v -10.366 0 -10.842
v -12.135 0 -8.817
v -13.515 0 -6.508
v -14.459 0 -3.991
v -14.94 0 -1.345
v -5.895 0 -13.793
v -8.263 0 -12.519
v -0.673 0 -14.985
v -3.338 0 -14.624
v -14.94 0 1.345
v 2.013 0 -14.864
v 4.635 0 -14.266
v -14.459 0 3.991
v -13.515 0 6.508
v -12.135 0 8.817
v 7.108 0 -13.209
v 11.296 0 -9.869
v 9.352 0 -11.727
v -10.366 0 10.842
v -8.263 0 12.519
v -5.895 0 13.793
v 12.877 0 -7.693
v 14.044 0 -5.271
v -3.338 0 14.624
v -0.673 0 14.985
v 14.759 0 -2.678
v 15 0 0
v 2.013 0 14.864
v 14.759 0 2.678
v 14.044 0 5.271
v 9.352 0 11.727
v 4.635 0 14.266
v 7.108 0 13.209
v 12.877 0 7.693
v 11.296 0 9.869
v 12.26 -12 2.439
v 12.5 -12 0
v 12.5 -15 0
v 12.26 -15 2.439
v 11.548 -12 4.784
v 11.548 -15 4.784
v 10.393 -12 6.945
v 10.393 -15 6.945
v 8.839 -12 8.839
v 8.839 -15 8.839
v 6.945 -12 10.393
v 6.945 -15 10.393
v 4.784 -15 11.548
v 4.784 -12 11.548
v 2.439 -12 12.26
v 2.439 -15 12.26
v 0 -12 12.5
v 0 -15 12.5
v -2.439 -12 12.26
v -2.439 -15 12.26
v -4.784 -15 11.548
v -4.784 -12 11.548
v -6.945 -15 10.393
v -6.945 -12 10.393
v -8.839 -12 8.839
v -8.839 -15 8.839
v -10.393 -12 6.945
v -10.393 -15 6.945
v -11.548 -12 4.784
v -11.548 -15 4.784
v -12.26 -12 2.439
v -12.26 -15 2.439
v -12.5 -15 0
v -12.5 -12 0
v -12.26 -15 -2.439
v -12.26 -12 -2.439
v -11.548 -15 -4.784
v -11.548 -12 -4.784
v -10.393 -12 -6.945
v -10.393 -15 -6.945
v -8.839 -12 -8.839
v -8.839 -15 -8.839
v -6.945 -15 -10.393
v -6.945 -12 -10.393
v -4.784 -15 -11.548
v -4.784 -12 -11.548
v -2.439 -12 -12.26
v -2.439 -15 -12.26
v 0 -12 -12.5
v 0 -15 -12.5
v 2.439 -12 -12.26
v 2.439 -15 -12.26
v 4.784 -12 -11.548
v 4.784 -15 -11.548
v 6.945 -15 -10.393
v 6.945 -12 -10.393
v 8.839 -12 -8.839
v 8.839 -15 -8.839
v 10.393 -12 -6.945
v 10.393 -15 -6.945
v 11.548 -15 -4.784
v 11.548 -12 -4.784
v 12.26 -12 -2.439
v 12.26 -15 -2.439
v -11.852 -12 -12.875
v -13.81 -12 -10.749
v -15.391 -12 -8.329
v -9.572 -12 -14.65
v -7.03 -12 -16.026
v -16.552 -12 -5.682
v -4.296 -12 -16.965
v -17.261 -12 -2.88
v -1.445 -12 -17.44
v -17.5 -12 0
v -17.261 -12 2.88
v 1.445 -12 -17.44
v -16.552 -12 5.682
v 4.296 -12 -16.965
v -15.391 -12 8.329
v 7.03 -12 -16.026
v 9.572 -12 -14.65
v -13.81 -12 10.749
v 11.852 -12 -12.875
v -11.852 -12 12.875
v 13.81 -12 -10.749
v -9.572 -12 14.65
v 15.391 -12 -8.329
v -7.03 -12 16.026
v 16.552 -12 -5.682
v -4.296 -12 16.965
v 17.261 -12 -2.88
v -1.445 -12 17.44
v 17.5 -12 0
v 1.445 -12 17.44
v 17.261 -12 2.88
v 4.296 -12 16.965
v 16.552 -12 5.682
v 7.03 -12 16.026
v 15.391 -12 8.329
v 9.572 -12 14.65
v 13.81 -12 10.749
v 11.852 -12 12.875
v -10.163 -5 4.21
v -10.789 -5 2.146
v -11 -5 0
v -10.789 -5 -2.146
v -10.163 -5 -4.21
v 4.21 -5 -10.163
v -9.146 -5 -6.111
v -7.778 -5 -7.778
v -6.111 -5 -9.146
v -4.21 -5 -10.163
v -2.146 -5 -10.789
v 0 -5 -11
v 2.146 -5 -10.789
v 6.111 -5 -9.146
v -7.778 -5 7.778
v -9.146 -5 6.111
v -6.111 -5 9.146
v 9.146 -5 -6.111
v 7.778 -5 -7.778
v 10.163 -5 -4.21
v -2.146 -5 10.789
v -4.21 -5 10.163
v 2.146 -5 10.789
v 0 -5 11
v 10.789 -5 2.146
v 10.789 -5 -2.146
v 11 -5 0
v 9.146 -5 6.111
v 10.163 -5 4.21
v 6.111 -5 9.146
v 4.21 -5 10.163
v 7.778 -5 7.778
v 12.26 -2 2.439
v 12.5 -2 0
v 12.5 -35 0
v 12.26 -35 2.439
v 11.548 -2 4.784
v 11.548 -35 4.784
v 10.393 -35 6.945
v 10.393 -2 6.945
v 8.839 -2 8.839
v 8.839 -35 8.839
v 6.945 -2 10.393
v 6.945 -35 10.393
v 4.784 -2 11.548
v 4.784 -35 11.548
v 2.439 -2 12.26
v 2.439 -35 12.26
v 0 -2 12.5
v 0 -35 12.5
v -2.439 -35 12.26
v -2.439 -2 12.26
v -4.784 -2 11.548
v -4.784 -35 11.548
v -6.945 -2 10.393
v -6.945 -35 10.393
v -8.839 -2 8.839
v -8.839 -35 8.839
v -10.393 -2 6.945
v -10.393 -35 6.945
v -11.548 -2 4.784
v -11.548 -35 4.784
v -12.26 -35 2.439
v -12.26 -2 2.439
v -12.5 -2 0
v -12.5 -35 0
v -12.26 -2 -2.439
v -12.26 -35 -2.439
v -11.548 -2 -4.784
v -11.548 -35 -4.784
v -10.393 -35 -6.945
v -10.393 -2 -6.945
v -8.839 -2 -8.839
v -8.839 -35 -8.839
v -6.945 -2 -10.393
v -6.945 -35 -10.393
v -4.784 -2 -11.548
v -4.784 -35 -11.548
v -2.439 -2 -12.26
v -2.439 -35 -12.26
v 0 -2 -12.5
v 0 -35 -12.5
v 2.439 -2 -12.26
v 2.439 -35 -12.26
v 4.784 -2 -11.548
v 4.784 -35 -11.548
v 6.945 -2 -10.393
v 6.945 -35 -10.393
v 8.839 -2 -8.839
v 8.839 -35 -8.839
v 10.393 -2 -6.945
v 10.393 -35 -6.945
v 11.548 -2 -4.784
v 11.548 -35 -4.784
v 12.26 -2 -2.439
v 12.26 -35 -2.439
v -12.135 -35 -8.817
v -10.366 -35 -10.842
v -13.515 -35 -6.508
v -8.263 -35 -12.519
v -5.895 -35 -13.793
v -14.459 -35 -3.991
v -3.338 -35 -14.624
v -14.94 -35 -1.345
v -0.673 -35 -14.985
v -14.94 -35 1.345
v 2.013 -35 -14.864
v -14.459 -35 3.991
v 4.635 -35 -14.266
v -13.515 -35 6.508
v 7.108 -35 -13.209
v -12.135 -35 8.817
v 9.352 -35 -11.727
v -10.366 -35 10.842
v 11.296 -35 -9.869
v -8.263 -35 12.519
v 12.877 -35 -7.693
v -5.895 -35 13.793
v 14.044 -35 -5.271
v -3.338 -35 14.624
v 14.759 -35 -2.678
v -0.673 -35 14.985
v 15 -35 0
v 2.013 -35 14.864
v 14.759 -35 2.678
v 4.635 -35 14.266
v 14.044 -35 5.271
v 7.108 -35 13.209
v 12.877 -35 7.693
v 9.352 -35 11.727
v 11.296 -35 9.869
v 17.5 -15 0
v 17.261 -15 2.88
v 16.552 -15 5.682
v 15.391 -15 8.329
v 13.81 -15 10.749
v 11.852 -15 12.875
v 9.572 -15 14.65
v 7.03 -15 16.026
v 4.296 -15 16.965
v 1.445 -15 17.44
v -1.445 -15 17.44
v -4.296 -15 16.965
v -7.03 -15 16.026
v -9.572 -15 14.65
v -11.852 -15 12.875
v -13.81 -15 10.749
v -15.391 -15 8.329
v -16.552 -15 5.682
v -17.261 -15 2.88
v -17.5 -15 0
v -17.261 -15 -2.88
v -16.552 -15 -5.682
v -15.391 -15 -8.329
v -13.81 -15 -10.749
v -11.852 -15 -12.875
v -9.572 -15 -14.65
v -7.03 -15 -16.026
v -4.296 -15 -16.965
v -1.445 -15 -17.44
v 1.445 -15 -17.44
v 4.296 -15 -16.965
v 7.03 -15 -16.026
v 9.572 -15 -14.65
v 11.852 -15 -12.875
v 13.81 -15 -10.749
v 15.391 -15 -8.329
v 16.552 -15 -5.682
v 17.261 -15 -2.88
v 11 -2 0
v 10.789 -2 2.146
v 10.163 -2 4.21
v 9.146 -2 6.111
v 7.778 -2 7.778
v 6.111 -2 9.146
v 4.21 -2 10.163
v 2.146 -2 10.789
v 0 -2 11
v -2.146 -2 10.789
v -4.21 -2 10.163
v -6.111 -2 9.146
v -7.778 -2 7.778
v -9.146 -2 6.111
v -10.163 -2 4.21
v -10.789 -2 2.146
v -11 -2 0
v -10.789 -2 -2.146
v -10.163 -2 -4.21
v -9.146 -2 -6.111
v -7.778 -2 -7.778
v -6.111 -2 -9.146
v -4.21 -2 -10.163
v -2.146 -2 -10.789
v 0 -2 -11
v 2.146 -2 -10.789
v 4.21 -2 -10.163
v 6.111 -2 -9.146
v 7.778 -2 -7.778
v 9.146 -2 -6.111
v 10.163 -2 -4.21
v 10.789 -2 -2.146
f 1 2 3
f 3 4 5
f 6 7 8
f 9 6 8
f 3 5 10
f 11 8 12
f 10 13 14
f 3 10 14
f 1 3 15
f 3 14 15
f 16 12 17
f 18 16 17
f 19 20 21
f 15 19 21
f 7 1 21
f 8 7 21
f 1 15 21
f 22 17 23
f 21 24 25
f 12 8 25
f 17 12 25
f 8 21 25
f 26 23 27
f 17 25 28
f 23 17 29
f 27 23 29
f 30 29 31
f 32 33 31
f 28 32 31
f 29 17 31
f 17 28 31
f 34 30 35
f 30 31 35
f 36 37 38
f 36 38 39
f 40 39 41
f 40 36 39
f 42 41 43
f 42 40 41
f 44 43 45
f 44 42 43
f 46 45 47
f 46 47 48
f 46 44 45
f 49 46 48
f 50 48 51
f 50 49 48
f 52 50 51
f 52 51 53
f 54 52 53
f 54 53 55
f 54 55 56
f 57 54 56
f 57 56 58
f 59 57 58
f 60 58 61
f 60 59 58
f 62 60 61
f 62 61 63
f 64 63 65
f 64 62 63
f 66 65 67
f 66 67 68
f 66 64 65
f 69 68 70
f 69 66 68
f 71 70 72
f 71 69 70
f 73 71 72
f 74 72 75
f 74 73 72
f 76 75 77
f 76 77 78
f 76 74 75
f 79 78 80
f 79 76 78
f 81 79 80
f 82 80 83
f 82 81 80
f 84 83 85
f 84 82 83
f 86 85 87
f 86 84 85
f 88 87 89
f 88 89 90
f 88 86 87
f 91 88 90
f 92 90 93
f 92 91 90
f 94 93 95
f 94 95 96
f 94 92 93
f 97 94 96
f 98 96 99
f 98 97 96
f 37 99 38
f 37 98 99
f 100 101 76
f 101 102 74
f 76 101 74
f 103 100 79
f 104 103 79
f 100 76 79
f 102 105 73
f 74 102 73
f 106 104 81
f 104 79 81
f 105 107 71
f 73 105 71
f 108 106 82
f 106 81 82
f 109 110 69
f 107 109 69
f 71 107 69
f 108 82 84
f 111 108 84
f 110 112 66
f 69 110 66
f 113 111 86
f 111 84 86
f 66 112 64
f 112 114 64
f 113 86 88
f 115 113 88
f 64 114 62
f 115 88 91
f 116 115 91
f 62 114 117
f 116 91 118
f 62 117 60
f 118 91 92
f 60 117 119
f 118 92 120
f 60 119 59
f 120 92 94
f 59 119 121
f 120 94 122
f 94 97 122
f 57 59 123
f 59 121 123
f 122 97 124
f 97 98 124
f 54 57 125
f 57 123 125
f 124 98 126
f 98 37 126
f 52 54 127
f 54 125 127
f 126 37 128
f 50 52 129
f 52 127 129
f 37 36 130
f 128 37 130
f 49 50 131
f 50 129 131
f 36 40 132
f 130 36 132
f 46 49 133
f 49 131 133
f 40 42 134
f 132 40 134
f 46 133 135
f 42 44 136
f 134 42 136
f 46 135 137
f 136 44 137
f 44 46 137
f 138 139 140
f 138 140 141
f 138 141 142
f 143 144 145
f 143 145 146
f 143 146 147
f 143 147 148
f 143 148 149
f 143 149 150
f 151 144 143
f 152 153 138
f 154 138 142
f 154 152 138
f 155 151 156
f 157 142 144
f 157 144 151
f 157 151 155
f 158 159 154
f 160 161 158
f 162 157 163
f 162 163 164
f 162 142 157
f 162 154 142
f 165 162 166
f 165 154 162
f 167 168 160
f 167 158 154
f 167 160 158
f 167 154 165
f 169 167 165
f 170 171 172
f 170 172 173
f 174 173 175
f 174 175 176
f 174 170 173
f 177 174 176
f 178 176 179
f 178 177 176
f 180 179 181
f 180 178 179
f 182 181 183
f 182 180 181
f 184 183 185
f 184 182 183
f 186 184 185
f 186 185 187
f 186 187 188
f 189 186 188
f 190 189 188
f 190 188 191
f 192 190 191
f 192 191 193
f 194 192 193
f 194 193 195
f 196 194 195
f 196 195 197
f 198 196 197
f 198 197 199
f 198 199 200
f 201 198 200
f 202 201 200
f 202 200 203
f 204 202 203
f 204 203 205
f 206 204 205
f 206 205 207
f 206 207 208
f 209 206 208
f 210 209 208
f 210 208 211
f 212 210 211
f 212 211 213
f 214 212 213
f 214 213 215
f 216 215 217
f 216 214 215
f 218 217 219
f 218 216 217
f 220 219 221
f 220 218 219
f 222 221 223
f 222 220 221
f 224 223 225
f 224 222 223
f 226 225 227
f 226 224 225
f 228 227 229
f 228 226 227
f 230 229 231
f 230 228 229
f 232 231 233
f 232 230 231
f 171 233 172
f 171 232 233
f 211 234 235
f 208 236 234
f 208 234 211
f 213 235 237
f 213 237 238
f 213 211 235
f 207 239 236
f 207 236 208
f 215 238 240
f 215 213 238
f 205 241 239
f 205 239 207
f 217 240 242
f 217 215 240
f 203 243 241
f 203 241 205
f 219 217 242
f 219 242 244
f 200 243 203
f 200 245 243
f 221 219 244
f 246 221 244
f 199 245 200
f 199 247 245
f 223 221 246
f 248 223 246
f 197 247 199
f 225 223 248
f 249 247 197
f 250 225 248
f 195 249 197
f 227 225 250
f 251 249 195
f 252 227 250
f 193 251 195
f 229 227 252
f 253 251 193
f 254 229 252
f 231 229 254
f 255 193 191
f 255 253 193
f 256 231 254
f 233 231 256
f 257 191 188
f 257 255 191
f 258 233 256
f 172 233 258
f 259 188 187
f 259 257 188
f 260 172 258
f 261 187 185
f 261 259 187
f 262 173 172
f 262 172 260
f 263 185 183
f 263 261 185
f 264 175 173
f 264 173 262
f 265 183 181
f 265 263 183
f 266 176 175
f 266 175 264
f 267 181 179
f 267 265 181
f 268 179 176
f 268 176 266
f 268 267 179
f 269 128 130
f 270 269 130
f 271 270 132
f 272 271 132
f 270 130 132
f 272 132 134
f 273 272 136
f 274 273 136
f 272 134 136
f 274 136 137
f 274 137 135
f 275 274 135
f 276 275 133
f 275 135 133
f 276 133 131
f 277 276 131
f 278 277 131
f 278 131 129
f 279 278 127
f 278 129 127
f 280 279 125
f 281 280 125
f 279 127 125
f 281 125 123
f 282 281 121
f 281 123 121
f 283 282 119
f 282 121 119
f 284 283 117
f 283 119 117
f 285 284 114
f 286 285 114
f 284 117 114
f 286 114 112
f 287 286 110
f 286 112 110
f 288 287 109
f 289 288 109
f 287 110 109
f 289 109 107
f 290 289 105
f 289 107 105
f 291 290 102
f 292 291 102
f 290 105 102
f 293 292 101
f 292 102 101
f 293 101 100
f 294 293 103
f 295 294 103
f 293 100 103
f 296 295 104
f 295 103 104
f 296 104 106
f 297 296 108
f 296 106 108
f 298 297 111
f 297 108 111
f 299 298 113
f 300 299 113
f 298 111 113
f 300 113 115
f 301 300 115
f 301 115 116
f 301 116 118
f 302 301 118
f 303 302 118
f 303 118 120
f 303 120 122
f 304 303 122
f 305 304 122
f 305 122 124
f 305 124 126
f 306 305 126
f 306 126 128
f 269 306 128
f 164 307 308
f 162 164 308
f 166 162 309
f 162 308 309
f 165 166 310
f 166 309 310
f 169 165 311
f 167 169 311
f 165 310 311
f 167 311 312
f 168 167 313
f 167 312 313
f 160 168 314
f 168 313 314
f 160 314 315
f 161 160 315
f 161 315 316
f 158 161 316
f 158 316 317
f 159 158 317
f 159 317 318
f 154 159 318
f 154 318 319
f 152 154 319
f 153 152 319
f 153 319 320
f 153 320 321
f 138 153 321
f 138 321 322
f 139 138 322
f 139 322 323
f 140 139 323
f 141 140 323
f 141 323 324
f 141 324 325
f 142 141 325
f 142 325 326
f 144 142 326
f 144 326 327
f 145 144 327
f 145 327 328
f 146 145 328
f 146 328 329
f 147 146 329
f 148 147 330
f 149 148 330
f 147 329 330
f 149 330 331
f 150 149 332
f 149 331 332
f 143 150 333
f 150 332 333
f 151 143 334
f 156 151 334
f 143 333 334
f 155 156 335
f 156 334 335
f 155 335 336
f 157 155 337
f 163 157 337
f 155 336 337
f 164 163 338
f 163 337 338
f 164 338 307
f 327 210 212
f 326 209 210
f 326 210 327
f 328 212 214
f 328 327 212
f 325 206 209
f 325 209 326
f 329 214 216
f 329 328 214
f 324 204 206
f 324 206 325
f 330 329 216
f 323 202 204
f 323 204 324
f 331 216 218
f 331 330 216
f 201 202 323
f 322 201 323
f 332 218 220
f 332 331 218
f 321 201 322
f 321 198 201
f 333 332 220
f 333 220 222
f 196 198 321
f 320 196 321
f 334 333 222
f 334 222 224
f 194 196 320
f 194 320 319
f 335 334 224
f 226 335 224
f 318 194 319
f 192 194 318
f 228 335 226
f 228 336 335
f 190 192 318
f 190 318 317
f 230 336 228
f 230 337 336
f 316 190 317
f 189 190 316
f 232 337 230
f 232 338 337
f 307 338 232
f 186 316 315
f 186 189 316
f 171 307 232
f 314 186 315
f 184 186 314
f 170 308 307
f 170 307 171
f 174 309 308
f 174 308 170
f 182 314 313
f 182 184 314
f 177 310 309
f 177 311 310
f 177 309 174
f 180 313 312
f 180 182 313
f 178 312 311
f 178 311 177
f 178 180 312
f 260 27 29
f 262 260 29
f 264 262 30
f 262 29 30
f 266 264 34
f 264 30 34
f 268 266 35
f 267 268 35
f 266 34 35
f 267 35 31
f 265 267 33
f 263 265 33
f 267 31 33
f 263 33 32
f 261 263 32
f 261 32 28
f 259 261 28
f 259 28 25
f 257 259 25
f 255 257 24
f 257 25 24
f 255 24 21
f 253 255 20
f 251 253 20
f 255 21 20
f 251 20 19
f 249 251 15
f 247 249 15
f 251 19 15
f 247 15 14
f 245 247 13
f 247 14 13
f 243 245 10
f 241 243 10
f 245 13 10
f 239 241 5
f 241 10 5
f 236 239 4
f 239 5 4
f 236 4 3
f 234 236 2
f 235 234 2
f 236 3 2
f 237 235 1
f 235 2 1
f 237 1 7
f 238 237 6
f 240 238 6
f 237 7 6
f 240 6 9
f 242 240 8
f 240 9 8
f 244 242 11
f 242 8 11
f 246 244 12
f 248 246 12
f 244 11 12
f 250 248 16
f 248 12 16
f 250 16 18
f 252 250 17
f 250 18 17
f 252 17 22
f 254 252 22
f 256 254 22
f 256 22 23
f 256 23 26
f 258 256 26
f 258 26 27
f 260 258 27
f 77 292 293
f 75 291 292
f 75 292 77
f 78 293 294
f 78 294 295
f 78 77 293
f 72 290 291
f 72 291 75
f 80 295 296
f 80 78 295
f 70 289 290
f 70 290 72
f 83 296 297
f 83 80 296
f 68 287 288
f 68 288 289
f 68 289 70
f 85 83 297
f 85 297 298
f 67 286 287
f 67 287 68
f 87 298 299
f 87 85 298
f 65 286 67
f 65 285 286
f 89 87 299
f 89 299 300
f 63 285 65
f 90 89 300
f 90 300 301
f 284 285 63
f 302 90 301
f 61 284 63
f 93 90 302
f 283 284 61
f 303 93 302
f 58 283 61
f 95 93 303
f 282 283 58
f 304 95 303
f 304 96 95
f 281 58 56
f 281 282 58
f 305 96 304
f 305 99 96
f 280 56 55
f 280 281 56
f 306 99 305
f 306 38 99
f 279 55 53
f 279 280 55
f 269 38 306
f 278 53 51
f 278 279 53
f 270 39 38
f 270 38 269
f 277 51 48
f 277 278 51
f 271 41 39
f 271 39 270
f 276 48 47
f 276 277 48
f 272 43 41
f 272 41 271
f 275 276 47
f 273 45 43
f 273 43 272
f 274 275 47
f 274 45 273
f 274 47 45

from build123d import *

# Parameters (mm, degrees)
F0_R     = 15
F0_R_2   = 12.5
F1_DEPTH = 35
F0_R_3   = 11
F2_DEPTH = 2
F3_DEPTH = 5
F0_R_4   = 17.5
F4_DEPTH = 3


with BuildPart() as f1:
    # F0 (on Front) → F1 (new body)
    with BuildSketch(Plane.XZ):
        Circle(F0_R)
        Circle(F0_R_2, mode=Mode.SUBTRACT)
    extrude(amount=F1_DEPTH)

    # F0 (on Front) → F2 (join)
    with BuildSketch(Plane.XZ):
        Circle(F0_R_2)
        Circle(F0_R_3, mode=Mode.SUBTRACT)
    extrude(amount=F2_DEPTH)

    # F0 (on Front) → F3 (join)
    with BuildSketch(Plane.XZ):
        Circle(F0_R_3)
    extrude(amount=F3_DEPTH)


with BuildPart() as f4:
    # F0 (on Front) → F4 (new body)
    with BuildSketch(Plane.XZ):
        Circle(F0_R_4)
        Circle(F0_R, mode=Mode.SUBTRACT)
        Circle(F0_R)
        Circle(F0_R_2, mode=Mode.SUBTRACT)
    extrude(amount=F4_DEPTH)


with BuildPart() as f4_1:
    # F5: moved
    add(f4.part.moved(Location((0, -12, 0))))


solid = Compound([f1.part, f4_1.part])
